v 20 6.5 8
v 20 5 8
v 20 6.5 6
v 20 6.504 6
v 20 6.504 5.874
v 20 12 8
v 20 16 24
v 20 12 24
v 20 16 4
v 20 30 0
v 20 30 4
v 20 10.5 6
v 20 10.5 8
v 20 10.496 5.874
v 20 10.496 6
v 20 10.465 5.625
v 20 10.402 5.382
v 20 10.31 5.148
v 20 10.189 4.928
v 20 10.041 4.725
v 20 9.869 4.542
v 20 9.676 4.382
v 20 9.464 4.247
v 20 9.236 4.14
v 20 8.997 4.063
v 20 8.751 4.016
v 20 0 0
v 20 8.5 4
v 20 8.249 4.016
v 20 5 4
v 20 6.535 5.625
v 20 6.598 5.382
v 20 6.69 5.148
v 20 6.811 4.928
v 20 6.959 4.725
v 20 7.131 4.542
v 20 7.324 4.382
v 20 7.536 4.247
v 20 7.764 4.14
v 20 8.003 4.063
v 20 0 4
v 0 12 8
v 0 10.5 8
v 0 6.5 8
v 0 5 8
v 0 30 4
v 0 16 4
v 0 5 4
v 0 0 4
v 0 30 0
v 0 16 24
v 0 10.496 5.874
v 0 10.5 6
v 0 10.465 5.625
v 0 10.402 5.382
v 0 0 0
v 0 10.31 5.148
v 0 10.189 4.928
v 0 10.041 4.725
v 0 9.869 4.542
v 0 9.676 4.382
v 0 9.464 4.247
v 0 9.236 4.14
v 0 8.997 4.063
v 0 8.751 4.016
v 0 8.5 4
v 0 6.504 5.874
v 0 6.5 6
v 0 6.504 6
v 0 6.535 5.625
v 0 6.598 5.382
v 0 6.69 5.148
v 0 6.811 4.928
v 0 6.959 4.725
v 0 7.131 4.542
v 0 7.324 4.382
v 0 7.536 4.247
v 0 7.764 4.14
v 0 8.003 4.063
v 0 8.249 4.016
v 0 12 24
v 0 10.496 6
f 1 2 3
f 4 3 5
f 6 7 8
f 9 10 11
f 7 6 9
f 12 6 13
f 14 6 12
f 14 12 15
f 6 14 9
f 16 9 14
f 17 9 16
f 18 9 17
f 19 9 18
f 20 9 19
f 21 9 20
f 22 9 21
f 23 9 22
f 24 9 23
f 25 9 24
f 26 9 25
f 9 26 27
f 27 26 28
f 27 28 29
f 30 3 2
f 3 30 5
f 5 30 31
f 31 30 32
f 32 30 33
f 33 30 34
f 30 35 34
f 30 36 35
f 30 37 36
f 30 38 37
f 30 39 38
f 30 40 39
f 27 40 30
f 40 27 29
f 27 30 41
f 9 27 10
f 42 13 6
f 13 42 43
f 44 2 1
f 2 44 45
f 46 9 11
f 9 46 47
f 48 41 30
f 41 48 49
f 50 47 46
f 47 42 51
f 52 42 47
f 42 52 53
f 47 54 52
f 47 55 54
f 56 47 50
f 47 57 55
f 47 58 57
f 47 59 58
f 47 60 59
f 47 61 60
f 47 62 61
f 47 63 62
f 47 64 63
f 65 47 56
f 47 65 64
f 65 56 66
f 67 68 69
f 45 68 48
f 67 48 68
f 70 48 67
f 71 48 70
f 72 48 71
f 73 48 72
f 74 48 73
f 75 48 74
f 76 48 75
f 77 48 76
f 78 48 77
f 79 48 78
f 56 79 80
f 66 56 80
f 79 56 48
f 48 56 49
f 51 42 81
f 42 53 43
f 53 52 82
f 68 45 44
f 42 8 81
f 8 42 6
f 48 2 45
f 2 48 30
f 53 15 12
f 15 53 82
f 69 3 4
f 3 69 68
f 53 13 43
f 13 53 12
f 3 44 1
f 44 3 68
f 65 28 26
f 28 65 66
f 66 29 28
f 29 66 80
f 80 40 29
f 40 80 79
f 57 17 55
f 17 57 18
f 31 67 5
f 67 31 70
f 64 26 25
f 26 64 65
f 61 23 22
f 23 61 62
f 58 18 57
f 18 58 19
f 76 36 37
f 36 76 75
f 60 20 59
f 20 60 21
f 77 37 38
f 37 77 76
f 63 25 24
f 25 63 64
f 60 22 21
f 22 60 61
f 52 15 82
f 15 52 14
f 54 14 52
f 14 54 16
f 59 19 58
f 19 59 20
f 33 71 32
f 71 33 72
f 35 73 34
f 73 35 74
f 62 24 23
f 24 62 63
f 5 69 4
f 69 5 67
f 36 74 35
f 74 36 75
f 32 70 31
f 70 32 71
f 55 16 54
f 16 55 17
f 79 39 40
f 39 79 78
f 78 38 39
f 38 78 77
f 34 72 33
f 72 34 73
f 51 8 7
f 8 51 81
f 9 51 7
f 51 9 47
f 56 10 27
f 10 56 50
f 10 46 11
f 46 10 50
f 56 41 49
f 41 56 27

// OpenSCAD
footLength = 30;
footWidth = 20;
footHeight = 4;

HolderDiam = 4;
HolderHeight = 20;

$fn = 50;

module holder() {
    union() {
        difference() {
            cube([footWidth, HolderDiam + 3, HolderDiam]);

            translate([0, 3 / 2, HolderDiam/ 2]) cube([footWidth, HolderDiam, HolderDiam]);

            translate([0, (HolderDiam + 3)/ 2, HolderDiam / 2]) rotate([0, 90, 0]) cylinder(d=HolderDiam, h=footWidth);
        }

        translate([0, HolderDiam + 3, 0]) cube([footWidth, 4, HolderHeight]);
    }
}

union() {
    cube([footWidth, footLength, footHeight]);

    translate([0, footLength/ 6, footHeight]) holder();
}
